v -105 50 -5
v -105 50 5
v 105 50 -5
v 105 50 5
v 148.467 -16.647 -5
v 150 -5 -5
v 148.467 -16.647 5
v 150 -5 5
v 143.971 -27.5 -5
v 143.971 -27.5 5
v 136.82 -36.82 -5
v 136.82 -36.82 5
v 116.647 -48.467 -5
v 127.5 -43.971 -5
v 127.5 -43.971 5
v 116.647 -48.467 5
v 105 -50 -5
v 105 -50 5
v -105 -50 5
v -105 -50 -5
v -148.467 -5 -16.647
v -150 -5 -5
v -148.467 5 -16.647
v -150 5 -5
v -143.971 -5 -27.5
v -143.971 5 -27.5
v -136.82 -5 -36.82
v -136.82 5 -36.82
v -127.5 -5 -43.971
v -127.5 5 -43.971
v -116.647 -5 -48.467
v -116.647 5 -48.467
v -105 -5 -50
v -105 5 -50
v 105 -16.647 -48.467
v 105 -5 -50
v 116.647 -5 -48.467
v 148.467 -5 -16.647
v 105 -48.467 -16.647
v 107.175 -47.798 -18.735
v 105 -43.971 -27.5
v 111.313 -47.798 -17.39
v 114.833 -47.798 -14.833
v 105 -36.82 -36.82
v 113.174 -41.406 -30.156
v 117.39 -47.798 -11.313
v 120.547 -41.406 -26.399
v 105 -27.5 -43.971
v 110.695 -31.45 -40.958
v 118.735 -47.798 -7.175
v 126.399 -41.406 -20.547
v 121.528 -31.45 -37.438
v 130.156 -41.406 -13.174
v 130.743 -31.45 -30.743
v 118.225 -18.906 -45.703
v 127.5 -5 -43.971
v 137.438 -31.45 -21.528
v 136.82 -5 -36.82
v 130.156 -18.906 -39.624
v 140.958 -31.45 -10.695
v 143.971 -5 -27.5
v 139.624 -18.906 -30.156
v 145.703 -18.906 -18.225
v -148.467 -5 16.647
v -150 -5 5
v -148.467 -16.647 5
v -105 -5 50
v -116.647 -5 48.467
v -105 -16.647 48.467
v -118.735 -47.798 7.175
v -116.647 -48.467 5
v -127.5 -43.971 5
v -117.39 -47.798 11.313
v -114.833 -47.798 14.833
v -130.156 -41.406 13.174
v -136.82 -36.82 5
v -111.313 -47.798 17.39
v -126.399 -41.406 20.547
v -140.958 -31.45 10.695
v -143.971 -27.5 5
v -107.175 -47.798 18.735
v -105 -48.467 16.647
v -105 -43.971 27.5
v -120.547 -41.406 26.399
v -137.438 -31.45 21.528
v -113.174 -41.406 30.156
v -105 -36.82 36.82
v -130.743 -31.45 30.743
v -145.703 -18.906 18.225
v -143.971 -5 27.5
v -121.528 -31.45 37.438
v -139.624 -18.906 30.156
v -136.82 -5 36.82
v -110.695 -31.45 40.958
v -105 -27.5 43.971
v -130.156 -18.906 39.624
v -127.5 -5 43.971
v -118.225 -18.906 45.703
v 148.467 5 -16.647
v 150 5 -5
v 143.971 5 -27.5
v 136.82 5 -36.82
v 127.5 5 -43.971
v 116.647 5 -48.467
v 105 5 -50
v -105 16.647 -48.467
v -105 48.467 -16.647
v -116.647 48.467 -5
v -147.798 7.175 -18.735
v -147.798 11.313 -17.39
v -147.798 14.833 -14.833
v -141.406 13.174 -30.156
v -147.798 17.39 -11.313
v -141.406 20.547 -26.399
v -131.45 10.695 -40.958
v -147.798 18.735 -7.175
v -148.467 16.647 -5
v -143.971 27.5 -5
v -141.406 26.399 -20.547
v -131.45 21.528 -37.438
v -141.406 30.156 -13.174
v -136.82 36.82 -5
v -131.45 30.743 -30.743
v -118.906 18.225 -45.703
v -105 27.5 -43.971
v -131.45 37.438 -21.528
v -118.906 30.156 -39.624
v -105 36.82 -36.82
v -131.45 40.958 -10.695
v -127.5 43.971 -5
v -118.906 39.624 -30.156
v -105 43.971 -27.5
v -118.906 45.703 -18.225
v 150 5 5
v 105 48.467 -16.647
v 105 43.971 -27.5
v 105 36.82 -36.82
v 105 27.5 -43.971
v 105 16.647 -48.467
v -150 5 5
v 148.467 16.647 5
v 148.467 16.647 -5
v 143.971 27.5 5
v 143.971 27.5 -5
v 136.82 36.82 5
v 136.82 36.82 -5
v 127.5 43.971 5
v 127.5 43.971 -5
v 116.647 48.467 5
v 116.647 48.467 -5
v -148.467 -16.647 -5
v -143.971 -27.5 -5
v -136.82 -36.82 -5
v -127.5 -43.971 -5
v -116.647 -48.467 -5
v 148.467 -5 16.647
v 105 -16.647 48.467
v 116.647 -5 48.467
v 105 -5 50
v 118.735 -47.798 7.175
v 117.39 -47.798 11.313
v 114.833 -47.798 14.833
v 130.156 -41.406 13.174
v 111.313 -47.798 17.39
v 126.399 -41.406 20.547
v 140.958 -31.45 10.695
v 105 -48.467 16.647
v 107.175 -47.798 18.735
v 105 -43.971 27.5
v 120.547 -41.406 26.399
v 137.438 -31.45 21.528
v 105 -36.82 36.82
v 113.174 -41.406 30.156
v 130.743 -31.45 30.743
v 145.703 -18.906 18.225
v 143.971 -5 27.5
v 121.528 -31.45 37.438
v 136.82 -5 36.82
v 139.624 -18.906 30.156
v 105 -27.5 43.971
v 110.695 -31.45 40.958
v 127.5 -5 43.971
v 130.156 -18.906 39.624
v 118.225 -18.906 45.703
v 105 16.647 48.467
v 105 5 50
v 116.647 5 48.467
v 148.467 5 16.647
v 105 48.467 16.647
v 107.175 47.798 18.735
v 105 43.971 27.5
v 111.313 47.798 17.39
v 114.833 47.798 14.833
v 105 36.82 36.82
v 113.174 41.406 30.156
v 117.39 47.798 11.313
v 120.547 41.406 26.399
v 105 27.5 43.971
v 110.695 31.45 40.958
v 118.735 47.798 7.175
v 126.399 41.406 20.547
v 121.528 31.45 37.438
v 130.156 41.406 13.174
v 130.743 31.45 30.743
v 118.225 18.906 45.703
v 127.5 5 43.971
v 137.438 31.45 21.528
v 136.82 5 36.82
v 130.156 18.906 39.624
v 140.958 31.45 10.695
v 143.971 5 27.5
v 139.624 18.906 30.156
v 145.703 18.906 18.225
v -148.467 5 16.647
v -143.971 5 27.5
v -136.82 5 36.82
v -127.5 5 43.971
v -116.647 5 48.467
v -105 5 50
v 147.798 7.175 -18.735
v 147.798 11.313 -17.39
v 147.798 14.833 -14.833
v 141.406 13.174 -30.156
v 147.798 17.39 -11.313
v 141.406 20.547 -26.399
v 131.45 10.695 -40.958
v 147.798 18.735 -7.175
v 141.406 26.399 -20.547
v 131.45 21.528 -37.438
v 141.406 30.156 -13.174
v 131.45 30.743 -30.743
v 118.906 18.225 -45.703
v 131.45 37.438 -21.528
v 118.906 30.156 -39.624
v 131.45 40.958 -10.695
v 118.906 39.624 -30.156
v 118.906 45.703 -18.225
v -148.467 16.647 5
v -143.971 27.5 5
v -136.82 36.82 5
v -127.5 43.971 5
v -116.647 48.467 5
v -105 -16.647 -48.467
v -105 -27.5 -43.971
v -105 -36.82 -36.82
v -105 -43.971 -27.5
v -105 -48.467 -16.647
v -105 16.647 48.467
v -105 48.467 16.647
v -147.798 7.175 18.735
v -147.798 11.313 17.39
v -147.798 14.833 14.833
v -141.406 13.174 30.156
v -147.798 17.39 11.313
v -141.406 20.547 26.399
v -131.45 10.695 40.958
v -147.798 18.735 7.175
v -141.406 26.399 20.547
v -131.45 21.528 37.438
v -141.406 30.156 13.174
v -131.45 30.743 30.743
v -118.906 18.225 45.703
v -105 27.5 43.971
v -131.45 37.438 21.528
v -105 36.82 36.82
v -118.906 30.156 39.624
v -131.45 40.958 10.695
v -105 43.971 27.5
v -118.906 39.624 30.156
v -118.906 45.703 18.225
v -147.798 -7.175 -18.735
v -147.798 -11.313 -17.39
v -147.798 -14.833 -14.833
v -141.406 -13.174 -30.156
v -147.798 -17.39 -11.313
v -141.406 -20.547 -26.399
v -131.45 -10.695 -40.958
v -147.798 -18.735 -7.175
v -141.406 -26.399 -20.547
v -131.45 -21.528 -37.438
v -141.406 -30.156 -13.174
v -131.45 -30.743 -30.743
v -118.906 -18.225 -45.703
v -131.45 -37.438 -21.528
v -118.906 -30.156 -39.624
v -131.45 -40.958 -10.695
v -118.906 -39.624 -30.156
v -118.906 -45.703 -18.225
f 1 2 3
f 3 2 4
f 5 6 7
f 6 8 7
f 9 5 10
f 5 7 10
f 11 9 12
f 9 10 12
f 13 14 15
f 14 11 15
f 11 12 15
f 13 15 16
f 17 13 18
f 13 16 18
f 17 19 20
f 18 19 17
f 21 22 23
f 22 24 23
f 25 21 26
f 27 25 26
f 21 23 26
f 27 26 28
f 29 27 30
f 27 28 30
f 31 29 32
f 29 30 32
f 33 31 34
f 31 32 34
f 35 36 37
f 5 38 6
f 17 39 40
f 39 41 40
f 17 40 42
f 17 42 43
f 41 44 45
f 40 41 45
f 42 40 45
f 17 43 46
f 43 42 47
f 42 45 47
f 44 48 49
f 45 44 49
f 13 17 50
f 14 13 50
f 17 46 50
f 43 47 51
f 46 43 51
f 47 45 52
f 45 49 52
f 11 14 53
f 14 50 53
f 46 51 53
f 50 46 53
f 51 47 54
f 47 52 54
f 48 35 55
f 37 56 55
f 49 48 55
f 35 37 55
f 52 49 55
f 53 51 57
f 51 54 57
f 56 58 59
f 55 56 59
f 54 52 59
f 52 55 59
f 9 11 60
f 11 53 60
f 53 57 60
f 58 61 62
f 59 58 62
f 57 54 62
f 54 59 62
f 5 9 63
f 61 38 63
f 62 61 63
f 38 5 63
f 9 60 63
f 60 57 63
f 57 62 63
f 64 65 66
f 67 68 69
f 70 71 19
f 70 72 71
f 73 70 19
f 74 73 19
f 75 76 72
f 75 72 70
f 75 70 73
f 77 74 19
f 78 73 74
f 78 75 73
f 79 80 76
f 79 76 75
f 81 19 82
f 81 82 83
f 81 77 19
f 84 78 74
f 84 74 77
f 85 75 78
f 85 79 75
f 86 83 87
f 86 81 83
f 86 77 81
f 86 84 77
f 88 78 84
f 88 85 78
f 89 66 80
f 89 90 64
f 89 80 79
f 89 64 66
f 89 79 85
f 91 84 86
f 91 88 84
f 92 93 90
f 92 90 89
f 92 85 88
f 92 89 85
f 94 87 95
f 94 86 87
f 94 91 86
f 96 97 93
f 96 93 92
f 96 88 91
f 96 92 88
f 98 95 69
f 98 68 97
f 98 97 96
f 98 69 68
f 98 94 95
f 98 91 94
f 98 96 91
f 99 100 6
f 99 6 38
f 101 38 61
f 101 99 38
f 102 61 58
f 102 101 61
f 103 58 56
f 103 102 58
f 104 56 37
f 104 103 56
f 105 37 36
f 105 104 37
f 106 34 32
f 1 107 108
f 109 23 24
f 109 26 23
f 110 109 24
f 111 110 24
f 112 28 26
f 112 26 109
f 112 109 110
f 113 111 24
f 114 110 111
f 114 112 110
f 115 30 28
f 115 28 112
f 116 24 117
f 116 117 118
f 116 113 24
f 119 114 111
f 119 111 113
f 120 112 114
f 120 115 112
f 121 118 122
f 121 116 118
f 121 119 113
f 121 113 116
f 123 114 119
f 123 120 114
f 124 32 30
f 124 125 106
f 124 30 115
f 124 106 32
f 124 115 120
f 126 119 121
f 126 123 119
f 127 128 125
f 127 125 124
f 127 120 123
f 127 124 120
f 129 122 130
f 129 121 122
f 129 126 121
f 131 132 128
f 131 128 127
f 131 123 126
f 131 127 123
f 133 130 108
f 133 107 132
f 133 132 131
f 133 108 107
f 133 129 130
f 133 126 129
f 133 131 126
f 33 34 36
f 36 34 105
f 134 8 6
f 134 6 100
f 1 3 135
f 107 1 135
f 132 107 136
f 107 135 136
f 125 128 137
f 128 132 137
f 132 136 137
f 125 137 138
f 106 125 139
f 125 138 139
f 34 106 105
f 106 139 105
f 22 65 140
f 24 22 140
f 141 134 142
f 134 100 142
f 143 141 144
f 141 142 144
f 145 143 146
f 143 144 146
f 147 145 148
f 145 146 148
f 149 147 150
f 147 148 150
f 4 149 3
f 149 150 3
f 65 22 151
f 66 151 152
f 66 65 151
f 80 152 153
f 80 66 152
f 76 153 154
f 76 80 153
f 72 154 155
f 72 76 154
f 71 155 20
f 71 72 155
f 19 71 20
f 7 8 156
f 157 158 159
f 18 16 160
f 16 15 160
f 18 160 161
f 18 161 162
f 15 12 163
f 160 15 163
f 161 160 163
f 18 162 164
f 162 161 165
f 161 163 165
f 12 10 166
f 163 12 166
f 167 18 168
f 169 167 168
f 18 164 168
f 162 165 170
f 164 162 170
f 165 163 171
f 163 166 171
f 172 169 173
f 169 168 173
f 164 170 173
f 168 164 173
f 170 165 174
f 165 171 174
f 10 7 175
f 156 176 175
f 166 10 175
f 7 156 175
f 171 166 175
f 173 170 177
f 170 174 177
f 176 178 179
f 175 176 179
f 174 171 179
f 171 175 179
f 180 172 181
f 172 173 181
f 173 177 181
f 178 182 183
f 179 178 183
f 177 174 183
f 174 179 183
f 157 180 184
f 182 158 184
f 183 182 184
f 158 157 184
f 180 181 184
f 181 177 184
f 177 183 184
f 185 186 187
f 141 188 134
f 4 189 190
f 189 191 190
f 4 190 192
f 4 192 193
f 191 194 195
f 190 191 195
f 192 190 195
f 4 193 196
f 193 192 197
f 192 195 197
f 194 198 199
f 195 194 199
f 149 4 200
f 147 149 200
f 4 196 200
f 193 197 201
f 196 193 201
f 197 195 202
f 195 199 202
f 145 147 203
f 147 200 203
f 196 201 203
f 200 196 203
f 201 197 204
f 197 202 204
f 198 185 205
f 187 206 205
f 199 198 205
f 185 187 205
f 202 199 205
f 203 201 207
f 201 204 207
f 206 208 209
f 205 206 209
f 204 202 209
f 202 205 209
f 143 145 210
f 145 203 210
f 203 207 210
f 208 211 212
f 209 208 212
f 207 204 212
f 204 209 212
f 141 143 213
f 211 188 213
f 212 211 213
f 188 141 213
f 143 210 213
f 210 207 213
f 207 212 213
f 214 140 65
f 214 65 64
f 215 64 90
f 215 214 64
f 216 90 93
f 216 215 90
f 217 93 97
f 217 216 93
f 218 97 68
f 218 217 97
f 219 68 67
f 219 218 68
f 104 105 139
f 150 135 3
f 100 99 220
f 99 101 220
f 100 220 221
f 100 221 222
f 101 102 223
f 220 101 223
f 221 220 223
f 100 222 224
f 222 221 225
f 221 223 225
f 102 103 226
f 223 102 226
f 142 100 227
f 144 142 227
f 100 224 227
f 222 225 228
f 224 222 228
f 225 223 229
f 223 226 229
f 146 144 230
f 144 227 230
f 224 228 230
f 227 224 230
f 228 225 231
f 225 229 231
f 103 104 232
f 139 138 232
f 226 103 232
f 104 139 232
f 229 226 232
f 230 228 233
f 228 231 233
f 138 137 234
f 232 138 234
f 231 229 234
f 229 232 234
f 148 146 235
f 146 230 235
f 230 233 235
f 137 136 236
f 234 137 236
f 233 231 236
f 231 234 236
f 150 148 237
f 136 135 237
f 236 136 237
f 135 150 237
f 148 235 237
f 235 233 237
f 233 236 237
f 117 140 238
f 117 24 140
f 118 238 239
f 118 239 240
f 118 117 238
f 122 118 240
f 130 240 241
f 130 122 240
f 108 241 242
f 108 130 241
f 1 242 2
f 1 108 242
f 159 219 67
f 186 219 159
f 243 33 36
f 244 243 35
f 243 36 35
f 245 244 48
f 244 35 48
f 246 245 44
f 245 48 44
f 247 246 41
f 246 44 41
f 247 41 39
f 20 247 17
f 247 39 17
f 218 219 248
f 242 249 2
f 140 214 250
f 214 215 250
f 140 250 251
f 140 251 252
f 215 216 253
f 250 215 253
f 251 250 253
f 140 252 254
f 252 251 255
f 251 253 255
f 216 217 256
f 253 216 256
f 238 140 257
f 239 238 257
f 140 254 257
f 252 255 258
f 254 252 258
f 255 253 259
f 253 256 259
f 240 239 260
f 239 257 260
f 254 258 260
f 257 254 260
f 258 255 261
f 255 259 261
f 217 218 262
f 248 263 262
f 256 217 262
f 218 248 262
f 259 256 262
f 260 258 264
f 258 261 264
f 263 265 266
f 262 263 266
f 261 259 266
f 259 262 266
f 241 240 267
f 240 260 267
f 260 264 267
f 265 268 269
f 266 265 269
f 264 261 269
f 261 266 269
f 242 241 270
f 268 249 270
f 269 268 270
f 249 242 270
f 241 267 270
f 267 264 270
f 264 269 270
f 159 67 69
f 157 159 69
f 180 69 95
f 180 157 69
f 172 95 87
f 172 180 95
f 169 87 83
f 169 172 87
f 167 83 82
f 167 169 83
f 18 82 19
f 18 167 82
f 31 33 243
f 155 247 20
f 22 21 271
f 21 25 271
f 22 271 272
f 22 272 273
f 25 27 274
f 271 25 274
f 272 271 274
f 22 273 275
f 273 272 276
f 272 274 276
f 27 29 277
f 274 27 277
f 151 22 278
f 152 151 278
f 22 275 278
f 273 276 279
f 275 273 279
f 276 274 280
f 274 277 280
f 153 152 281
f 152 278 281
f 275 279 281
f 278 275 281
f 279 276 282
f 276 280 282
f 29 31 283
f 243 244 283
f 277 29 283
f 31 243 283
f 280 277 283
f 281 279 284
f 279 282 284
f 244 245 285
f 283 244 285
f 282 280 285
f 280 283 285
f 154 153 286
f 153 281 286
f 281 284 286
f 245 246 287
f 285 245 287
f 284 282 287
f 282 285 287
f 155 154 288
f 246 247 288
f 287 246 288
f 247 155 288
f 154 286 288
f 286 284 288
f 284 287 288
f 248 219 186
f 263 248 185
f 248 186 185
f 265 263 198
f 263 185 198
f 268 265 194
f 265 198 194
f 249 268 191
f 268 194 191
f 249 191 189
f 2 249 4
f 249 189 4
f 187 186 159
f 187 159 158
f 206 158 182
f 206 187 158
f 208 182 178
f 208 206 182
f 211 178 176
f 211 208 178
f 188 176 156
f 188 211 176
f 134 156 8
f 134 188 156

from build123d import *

# Parameters (mm, degrees)
SKETCH1_W           = 300
SKETCH1_H           = 100
BOSS_EXTRUDE1_DEPTH = 50
FILLET1_R           = 45


with BuildPart() as part:
    # Sketch1 → Boss-Extrude1 (new, symmetric)
    with BuildSketch(Plane.XY):
        Rectangle(SKETCH1_W, SKETCH1_H)
    extrude(amount=BOSS_EXTRUDE1_DEPTH, both=True)

    # Fillet1
    fillet1_edges = [part.edges().sort_by_distance(p)[0] for p in [
        (150, 0, 50),
        (0, 50, 50),
        (-150, 0, 50),
        (0, 50, -50),
        (150, 0, -50),
        (0, -50, -50),
        (-150, 0, -50),
        (-150, 50, 0),
        (150, 50, 0),
        (150, -50, 0),
        (-150, -50, 0),
        (0, -50, 50),
    ]]
    fillet(fillet1_edges, radius=FILLET1_R)


solid = part.part
